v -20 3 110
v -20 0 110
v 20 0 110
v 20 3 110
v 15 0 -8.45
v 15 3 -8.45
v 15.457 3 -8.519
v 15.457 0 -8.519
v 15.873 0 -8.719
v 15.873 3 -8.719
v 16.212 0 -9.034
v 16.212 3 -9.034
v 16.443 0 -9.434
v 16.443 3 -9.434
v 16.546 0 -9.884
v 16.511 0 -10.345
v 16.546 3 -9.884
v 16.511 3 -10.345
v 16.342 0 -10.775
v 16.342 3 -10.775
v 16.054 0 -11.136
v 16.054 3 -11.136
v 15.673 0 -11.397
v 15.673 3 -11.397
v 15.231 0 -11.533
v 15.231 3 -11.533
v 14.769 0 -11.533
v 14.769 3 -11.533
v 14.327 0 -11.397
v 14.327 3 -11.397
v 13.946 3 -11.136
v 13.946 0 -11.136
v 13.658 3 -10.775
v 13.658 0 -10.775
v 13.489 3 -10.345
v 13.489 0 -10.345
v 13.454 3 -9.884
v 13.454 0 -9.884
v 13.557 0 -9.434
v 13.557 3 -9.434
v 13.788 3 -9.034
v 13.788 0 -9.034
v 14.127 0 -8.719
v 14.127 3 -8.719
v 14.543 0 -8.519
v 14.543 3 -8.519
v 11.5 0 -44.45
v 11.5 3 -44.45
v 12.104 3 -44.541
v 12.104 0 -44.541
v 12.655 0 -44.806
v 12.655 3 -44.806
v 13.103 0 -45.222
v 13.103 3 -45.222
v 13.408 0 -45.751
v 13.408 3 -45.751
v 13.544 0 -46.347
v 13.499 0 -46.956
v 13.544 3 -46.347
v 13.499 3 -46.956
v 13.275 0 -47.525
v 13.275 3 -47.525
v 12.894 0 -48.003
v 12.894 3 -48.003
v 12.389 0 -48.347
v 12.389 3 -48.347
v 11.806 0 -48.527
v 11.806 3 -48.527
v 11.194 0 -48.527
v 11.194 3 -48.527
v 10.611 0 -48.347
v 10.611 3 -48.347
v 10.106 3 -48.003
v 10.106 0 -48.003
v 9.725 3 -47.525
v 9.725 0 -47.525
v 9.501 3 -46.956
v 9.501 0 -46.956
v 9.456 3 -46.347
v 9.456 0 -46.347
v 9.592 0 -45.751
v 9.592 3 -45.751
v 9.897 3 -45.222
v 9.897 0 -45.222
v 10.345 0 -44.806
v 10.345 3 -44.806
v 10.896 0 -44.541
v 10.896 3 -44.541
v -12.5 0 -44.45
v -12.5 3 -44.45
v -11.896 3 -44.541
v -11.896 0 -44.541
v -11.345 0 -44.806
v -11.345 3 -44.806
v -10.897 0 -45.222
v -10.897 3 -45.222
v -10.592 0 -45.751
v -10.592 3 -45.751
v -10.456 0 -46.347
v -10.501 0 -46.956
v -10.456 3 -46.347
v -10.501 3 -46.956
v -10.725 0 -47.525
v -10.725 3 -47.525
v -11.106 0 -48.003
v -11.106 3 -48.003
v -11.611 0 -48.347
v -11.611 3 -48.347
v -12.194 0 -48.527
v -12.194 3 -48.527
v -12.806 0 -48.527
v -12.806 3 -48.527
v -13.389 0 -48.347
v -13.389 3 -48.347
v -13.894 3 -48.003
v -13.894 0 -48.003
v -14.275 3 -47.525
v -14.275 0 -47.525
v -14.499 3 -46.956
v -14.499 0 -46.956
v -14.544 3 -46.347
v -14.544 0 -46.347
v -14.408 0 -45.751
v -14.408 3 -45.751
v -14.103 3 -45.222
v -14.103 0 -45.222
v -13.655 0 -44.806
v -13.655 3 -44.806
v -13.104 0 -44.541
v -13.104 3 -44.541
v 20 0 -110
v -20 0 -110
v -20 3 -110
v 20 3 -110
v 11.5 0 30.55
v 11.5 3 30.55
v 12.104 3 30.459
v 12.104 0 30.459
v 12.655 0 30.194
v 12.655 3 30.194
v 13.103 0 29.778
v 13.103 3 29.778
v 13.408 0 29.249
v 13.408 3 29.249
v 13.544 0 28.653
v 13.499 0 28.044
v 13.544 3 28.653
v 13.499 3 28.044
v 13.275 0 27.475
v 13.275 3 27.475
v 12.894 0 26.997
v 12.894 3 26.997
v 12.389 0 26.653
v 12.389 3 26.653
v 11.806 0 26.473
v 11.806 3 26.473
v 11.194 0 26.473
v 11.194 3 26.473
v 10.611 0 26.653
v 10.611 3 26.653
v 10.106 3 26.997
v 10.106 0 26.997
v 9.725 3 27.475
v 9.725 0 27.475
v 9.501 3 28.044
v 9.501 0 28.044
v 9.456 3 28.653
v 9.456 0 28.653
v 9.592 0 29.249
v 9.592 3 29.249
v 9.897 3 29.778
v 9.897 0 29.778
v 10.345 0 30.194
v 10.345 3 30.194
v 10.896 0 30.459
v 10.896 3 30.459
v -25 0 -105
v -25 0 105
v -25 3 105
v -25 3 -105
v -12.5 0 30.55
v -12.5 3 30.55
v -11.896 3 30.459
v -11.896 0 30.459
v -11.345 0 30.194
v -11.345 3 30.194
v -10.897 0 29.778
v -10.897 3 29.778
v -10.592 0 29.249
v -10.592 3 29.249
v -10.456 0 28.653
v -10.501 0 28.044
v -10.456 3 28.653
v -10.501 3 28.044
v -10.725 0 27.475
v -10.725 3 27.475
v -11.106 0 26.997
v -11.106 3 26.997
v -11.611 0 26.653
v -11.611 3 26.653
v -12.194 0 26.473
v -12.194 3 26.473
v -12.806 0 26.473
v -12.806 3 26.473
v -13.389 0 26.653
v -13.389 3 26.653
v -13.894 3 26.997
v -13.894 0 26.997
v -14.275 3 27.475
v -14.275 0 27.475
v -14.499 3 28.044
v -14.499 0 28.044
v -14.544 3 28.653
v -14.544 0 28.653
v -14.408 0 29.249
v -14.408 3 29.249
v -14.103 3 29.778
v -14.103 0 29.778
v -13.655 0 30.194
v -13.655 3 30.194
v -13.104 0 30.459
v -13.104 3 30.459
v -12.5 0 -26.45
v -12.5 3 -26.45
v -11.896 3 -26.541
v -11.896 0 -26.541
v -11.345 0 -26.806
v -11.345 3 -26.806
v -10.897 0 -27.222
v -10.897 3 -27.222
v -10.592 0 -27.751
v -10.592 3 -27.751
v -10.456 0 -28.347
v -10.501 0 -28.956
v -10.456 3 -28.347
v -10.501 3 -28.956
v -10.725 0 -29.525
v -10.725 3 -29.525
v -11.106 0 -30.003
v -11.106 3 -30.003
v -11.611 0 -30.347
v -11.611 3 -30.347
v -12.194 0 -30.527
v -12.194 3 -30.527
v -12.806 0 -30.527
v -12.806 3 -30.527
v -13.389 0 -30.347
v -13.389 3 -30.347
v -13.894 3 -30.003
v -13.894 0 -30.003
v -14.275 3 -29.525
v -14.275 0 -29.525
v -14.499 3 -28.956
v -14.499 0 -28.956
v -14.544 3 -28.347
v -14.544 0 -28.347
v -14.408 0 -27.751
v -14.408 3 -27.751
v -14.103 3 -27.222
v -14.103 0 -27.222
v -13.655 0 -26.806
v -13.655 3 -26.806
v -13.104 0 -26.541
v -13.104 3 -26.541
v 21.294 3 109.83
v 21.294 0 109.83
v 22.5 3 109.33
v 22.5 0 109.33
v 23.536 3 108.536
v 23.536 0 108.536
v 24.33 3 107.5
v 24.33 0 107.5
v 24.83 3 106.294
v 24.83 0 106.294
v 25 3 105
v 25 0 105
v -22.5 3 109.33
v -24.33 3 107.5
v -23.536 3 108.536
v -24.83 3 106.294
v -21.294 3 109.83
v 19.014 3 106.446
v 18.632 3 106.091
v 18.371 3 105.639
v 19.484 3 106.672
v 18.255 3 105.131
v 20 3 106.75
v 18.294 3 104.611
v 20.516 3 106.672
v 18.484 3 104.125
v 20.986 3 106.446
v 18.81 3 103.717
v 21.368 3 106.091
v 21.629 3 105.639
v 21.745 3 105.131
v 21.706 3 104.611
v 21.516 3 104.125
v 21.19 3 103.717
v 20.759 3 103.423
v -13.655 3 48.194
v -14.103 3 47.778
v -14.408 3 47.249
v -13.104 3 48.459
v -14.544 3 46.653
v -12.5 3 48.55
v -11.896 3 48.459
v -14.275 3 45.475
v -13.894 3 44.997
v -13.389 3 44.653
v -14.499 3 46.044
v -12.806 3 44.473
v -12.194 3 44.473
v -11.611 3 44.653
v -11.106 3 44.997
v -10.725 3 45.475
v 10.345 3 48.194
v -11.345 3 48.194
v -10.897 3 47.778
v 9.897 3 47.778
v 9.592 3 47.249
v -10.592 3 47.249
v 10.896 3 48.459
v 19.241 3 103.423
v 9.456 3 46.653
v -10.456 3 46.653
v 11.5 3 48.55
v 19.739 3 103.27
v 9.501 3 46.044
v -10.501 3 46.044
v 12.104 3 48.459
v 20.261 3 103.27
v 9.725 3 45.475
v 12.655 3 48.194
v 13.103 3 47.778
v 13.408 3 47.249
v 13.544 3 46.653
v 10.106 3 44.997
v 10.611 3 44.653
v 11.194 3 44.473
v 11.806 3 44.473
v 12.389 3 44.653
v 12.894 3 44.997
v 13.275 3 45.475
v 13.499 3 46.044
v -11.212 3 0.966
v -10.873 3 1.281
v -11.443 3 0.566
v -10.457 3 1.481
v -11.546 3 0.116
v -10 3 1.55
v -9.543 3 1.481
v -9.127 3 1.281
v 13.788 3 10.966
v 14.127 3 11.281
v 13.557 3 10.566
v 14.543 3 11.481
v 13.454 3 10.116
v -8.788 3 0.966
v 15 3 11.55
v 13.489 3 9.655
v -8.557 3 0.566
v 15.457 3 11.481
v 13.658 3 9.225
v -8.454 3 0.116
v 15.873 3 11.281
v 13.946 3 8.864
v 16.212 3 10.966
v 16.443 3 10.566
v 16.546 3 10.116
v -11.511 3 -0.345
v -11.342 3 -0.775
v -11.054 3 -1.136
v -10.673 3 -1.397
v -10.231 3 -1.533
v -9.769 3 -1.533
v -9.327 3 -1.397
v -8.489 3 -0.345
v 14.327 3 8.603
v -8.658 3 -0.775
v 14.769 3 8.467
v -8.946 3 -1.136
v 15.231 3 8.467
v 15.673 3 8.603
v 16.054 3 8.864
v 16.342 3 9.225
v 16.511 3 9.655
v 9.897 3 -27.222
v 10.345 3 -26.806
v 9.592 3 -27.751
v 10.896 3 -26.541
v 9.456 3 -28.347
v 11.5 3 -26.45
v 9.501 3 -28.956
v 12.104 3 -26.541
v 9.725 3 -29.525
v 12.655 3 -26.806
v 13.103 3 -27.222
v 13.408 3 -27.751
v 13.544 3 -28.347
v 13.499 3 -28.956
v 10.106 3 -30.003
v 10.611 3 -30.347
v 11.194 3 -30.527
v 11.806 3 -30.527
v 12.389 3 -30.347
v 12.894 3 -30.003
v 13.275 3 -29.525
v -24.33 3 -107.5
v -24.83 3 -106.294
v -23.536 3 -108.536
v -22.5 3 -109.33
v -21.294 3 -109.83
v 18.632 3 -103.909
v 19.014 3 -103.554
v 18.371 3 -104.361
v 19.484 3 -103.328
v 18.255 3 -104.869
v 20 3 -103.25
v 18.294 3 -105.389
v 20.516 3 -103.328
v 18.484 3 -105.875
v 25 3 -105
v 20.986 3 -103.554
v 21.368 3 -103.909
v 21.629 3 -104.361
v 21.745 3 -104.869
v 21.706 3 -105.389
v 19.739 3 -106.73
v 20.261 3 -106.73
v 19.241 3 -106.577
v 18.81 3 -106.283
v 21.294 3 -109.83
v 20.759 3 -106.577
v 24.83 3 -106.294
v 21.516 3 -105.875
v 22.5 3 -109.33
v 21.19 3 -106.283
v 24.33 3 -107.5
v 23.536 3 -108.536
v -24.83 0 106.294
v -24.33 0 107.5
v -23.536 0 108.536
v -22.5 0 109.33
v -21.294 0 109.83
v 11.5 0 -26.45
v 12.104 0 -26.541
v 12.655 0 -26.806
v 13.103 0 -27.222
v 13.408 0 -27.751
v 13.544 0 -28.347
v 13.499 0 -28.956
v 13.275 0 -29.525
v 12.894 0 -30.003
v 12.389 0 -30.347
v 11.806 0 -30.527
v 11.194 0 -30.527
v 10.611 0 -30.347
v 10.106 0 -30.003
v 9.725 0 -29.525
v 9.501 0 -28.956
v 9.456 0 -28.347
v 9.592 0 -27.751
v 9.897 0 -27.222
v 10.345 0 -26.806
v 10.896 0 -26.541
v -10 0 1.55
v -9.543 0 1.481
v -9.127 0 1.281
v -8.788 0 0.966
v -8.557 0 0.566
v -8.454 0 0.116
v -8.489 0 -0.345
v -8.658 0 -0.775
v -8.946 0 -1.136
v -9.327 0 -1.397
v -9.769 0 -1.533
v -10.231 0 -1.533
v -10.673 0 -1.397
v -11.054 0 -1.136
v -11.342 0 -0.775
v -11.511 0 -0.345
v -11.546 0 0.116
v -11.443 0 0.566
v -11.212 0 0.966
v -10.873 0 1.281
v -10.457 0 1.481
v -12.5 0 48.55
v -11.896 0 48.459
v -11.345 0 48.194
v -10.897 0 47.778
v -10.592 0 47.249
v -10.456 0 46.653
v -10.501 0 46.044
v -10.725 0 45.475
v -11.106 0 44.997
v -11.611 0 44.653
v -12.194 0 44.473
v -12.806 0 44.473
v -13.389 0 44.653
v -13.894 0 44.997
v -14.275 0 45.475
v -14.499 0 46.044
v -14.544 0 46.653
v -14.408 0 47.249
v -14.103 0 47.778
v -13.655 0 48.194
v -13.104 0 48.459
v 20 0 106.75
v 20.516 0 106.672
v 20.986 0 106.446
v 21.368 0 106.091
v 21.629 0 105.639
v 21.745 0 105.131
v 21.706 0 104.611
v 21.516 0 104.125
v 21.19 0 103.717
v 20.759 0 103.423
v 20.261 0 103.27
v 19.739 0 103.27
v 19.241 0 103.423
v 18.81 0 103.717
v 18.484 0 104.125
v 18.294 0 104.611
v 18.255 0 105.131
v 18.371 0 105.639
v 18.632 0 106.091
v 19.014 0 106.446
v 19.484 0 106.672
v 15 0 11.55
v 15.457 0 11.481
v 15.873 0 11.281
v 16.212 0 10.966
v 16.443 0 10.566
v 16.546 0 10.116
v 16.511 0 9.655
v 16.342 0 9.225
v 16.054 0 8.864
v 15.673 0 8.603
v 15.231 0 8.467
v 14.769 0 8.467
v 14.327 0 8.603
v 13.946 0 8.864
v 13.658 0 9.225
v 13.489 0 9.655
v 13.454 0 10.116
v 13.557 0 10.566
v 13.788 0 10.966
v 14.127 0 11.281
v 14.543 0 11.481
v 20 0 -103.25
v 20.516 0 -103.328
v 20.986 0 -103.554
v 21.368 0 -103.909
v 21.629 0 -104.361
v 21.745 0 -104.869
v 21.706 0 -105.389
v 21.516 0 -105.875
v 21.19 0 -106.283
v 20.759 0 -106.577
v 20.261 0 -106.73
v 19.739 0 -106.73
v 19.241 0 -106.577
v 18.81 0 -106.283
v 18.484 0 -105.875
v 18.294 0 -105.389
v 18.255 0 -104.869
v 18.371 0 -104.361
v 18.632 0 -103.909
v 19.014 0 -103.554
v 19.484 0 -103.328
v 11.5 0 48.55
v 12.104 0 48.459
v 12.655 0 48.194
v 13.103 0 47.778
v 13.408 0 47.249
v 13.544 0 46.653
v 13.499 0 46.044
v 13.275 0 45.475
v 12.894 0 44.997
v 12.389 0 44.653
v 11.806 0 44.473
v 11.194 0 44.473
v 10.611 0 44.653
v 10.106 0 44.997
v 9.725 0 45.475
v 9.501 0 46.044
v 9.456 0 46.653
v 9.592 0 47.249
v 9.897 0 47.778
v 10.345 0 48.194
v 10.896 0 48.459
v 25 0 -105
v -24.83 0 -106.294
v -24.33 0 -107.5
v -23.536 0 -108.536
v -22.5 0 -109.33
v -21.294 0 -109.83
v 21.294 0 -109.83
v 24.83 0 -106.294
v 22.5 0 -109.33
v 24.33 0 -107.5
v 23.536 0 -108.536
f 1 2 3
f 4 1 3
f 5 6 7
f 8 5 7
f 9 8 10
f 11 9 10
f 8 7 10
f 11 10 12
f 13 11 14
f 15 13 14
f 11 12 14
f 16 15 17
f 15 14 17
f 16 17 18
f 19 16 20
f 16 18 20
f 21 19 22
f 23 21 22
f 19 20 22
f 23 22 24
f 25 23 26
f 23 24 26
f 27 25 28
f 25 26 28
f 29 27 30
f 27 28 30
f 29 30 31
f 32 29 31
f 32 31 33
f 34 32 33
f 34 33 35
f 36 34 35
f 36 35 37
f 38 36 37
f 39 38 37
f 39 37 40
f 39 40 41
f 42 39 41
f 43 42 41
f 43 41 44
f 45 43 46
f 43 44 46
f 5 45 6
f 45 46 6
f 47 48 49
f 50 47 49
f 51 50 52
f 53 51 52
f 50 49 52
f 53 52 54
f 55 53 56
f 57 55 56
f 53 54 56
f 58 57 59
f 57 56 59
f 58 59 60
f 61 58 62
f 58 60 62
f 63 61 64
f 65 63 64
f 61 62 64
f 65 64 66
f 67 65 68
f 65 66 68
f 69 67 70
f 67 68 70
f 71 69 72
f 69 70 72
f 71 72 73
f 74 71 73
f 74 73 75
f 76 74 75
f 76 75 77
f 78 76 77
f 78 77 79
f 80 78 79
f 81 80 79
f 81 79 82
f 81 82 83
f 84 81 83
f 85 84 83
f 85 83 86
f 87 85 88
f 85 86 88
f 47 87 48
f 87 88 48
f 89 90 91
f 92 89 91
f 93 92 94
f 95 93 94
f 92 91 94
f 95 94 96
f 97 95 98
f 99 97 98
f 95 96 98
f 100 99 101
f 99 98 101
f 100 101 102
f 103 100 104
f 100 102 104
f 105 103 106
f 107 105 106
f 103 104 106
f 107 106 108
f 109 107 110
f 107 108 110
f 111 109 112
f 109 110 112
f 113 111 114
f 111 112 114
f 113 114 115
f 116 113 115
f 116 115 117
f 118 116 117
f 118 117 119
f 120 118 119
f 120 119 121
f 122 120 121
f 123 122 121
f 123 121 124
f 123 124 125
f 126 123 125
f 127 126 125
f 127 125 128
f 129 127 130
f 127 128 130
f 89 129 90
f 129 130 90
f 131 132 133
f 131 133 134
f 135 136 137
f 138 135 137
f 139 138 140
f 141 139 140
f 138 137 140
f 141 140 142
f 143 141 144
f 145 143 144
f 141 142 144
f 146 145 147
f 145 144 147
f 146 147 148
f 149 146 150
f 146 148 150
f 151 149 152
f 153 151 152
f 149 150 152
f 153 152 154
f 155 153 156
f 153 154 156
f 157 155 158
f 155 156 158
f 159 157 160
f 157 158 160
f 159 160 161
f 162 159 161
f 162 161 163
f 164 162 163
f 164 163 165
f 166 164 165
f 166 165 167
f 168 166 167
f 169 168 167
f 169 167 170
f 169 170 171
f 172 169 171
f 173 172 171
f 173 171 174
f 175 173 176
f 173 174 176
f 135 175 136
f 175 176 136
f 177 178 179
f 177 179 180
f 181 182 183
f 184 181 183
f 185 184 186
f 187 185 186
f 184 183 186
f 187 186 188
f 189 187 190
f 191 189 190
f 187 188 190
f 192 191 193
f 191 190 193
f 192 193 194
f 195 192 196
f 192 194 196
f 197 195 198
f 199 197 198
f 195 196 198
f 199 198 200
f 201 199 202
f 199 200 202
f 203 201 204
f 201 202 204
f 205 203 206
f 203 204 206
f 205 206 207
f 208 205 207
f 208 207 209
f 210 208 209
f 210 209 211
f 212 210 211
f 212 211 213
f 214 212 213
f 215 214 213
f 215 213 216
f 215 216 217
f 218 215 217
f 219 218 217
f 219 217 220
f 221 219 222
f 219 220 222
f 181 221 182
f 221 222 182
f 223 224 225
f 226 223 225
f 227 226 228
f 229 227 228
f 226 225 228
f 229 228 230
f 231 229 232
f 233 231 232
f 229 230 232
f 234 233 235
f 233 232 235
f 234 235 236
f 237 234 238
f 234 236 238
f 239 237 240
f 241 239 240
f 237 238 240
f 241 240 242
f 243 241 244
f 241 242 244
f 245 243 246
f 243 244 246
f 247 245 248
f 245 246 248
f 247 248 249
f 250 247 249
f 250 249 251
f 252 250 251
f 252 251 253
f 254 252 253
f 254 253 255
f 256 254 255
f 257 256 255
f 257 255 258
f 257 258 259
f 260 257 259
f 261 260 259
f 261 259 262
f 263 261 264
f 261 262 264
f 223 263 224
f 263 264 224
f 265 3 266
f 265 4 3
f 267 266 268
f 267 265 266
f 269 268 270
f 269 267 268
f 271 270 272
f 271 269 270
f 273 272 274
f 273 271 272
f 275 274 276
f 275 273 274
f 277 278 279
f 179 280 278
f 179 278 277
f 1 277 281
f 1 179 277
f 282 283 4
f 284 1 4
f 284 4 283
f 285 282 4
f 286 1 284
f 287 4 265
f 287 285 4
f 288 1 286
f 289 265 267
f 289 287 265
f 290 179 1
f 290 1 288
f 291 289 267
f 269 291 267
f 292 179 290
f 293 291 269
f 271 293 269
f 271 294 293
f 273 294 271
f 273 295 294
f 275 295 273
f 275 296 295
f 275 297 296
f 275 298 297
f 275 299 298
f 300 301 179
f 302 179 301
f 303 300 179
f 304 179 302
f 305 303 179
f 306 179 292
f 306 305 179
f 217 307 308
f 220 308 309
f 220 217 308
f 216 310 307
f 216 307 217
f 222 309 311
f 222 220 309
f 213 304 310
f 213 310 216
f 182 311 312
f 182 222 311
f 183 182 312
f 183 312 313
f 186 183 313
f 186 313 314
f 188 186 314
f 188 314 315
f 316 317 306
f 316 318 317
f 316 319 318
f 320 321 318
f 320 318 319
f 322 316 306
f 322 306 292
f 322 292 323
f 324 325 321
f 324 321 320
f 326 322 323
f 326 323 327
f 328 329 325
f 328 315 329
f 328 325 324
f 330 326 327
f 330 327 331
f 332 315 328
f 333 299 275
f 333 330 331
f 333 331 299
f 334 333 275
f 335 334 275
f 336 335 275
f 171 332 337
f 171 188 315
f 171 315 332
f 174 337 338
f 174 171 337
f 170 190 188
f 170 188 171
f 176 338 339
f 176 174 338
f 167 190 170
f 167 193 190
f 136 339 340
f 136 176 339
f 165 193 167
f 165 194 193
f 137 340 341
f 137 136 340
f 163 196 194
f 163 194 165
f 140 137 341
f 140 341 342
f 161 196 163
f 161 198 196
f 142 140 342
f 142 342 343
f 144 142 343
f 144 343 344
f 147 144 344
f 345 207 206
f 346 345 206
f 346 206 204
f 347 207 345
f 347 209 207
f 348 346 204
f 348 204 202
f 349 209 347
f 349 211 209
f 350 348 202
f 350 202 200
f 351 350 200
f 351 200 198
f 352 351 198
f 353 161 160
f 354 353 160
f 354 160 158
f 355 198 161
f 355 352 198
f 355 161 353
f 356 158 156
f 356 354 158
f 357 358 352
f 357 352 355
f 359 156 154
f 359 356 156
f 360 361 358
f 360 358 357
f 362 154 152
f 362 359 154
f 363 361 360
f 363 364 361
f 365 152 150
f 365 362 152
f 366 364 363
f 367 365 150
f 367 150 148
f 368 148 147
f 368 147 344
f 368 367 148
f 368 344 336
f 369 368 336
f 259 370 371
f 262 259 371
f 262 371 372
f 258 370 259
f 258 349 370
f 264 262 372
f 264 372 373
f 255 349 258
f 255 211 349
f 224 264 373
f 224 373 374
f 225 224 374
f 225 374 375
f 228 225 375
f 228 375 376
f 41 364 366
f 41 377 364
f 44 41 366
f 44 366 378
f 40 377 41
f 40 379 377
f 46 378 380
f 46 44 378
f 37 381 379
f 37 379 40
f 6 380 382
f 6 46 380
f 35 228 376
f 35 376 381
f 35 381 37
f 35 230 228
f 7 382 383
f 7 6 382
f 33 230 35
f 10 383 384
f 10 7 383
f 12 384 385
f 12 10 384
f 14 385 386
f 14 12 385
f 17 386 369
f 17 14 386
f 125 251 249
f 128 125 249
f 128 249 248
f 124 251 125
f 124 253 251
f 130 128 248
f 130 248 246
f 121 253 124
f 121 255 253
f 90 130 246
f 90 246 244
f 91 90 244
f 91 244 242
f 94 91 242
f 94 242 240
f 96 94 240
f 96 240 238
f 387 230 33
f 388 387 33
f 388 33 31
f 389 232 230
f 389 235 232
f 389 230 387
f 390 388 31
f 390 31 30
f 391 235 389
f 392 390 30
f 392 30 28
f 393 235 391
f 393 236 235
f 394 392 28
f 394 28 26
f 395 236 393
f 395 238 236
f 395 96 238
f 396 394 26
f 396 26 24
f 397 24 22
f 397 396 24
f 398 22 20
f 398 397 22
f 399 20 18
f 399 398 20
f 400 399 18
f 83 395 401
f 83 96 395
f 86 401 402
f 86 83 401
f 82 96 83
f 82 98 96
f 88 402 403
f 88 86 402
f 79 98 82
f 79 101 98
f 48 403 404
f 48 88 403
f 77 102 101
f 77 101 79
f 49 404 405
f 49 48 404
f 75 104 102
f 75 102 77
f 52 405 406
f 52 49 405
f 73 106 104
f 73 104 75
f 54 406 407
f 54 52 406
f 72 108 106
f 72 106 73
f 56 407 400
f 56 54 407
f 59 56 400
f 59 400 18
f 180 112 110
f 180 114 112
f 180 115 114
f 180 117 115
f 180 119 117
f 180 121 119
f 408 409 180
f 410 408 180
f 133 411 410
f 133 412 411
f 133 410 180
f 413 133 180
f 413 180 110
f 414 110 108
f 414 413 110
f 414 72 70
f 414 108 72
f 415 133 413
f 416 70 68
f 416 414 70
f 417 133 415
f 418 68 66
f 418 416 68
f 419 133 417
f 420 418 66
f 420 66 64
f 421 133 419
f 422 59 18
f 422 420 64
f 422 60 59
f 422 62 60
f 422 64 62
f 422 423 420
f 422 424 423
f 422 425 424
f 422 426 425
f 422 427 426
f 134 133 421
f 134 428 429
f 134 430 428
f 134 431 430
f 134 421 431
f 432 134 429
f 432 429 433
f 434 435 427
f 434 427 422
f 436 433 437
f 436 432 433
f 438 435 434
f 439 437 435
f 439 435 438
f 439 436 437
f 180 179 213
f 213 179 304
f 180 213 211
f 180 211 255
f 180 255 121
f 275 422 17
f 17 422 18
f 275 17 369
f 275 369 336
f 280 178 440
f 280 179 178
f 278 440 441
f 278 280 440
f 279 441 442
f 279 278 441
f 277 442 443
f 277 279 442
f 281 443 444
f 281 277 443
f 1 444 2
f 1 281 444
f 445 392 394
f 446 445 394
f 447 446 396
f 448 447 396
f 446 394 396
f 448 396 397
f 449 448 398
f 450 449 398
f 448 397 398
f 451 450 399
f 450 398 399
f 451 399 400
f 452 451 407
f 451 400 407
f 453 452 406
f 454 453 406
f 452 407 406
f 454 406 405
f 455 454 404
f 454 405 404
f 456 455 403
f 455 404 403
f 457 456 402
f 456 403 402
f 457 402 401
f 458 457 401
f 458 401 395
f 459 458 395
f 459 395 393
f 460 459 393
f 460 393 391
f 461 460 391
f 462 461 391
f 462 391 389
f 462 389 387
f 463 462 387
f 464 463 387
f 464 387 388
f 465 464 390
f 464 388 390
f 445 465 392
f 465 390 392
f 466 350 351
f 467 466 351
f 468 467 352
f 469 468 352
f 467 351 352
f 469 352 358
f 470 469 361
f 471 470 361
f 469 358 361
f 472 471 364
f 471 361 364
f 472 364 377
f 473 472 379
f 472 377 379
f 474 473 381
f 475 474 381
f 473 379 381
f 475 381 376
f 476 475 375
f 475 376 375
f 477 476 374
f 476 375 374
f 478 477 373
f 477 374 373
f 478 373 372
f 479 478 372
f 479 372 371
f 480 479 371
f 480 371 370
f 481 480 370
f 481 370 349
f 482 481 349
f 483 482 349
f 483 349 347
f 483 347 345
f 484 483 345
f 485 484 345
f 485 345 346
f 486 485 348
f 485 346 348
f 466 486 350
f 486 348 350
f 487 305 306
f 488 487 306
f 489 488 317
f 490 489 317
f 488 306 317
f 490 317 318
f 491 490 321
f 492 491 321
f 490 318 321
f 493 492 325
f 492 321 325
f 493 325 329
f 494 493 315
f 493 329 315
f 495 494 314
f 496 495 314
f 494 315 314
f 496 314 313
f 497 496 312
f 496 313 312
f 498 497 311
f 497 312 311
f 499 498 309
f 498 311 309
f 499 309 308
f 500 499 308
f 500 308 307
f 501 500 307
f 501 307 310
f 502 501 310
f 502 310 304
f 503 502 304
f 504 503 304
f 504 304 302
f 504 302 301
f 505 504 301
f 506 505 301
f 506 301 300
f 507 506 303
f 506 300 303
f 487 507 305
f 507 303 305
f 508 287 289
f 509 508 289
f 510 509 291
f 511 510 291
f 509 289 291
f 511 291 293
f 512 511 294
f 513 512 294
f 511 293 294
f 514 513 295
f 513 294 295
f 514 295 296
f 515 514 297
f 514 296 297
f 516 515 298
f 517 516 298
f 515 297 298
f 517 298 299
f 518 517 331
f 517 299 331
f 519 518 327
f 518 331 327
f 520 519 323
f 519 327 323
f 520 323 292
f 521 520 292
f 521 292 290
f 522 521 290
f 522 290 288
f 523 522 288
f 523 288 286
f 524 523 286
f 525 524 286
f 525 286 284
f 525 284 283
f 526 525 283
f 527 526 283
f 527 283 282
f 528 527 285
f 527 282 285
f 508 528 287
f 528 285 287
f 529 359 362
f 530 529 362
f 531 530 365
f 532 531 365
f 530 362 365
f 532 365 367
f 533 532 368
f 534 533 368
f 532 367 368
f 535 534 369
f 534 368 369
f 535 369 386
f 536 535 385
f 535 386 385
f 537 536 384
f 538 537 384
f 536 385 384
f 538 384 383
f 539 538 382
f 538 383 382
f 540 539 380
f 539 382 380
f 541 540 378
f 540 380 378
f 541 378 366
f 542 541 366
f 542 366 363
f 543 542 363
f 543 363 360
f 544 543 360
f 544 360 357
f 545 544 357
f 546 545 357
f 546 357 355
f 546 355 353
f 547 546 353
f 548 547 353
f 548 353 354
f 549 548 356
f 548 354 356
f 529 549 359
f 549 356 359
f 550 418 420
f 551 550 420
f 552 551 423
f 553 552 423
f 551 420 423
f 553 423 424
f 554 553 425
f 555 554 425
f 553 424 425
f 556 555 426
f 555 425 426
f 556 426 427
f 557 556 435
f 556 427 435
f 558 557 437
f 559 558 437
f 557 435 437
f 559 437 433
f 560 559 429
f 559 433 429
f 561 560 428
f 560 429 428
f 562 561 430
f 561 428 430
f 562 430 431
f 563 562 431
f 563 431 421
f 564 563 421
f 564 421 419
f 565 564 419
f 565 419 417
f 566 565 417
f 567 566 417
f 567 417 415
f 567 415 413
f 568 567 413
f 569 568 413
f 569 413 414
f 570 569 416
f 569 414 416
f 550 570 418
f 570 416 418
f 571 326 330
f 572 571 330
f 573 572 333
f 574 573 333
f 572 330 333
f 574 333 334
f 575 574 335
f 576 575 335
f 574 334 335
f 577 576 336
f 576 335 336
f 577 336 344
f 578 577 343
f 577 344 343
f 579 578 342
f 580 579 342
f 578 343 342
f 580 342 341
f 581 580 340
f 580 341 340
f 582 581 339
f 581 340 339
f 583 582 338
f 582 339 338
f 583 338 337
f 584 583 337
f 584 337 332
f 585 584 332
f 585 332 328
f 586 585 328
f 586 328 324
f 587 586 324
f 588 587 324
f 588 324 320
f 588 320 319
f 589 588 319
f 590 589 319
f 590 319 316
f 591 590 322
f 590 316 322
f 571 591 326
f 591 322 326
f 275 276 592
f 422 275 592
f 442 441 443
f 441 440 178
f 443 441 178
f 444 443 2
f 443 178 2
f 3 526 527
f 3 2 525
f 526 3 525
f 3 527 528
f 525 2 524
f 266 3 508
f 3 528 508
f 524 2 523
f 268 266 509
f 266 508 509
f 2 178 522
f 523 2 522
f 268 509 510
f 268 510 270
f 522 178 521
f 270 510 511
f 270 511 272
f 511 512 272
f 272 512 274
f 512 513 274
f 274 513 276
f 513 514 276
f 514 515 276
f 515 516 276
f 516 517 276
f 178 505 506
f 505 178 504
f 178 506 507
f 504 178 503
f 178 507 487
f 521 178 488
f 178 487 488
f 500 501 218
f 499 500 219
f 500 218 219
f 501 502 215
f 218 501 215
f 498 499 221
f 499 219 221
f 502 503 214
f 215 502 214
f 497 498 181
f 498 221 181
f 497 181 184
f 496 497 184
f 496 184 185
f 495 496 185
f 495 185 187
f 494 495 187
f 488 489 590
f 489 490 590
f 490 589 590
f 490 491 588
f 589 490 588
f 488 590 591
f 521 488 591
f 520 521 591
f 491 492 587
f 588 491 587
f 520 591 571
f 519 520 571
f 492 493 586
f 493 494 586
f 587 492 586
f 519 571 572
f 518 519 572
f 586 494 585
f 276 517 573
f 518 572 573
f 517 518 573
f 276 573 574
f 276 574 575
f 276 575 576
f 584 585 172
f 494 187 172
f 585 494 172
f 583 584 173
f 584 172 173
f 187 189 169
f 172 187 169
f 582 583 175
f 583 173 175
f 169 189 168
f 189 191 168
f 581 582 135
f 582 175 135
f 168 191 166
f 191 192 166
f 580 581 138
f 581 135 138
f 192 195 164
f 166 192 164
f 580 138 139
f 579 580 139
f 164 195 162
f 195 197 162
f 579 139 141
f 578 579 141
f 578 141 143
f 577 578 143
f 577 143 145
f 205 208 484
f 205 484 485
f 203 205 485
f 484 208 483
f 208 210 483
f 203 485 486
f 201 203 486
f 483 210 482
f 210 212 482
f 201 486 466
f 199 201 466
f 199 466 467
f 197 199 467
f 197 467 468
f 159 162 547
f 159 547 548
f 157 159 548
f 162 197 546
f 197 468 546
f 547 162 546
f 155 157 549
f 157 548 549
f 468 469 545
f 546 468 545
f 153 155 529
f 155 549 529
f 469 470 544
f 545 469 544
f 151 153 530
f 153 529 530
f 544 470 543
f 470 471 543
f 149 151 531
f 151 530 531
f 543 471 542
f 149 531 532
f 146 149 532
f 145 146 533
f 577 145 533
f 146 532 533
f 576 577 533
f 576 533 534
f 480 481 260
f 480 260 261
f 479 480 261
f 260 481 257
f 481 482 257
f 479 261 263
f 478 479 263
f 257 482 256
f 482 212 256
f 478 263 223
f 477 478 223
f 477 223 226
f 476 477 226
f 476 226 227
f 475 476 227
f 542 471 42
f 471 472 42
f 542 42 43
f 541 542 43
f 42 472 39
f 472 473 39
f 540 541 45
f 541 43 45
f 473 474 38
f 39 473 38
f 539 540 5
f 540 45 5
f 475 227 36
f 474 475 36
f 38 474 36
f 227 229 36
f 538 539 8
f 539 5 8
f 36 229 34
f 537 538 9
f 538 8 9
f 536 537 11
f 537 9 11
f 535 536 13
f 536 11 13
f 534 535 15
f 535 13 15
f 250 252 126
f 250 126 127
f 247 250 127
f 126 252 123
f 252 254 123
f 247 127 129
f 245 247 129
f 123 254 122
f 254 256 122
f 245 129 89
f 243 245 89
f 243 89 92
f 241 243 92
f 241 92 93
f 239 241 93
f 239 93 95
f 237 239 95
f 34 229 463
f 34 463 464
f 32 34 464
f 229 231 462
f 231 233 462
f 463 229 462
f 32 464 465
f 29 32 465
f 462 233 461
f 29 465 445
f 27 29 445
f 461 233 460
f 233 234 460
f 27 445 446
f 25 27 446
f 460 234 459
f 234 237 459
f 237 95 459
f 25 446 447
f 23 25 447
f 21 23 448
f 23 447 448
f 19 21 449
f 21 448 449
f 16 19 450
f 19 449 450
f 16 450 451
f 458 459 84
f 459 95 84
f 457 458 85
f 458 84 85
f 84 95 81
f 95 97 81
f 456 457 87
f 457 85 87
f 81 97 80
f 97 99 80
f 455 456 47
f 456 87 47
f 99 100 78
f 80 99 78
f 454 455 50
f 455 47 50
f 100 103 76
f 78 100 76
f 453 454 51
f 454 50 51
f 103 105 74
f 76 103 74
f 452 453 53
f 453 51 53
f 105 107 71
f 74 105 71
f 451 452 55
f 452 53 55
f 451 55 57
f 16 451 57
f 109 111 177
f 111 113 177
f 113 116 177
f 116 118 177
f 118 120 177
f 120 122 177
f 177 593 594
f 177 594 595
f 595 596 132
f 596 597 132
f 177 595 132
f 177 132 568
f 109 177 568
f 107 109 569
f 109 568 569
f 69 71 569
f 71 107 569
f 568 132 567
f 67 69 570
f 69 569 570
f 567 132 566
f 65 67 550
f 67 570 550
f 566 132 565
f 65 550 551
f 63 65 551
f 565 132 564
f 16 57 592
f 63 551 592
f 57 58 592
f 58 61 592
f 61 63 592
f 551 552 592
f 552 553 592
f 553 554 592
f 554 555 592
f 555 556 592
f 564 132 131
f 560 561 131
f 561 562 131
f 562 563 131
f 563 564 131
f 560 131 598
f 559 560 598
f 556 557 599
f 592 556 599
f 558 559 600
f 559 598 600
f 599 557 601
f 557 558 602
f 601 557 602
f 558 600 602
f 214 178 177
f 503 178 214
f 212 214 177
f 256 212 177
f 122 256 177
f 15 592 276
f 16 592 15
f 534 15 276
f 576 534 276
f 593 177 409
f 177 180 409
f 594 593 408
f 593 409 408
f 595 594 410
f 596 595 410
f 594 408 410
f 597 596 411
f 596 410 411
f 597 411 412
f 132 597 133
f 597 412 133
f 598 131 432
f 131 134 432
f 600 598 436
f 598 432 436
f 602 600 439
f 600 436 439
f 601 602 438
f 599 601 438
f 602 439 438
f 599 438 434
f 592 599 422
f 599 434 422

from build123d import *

# Parameters (mm, degrees)
SKETCH1_W       = 50
SKETCH1_H       = 220
EXTRUDE1_DEPTH  = 3
SKETCH2_R       = 1.75
EXTRUDE2_DEPTH  = 3
SKETCH3_R       = 2.05
EXTRUDE3_DEPTH  = 3
SKETCH4_R       = 1.55
EXTRUDE4_DEPTH  = 3
LPATTERN1_COUNT = 2
LPATTERN1_PITCH = 210
LPATTERN2_COUNT = 2
LPATTERN2_PITCH = 75
FILLET1_R       = 5


with BuildPart() as part:
    # Sketch1 → Extrude1 (new body)
    with BuildSketch(Plane(origin=(0, 0, 0), x_dir=(1, 0, 0), z_dir=(0, 1, 0))):
        Rectangle(SKETCH1_W, SKETCH1_H)
    extrude(amount=EXTRUDE1_DEPTH)

    # Sketch2 → Extrude2 (cut)
    with BuildSketch(Plane(origin=(0, 3, 0), x_dir=(1, 0, 0), z_dir=(0, 1, 0))):
        with Locations(Location((20, 105, 0), (0, 0, 270))):
            Circle(SKETCH2_R)
    extrude2 = extrude(amount=-EXTRUDE2_DEPTH, mode=Mode.SUBTRACT)

    # Sketch3 → Extrude3 (cut)
    with BuildSketch(Plane(origin=(0, 3, 0), x_dir=(1, 0, 0), z_dir=(0, 1, 0))):
        with Locations(Location((-12.5, 46.5, 0), (0, 0, 270))):
            Circle(SKETCH3_R)
        with Locations(Location((11.5, 46.5, 0), (0, 0, 270))):
            Circle(SKETCH3_R)
        with Locations(Location((-12.5, 28.5, 0), (0, 0, 270))):
            Circle(SKETCH3_R)
        with Locations(Location((11.5, 28.5, 0), (0, 0, 270))):
            Circle(SKETCH3_R)
    extrude3 = extrude(amount=-EXTRUDE3_DEPTH, mode=Mode.SUBTRACT)

    # Sketch4 → Extrude4 (cut)
    with BuildSketch(Plane(origin=(0, 3, 0), x_dir=(1, 0, 0), z_dir=(0, 1, 0))):
        with Locations(Location((15, 10, 0), (0, 0, 270))):
            Circle(SKETCH4_R)
        with Locations(Location((15, -10, 0), (0, 0, 270))):
            Circle(SKETCH4_R)
        with Locations(Location((-10, 0, 0), (0, 0, 270))):
            Circle(SKETCH4_R)
    extrude(amount=-EXTRUDE4_DEPTH, mode=Mode.SUBTRACT)

    # LPattern1: Extrude2 ×2
    with Locations(*[(0, 0, i * LPATTERN1_PITCH) for i in range(1, LPATTERN1_COUNT)]):
        add(extrude2, mode=Mode.SUBTRACT)

    # LPattern2: Extrude3 ×2
    with Locations(*[(0, 0, i * LPATTERN2_PITCH) for i in range(1, LPATTERN2_COUNT)]):
        add(extrude3, mode=Mode.SUBTRACT)

    # Fillet1
    fillet1_edges = [part.edges().sort_by_distance(p)[0] for p in [
        (-25, 1.5, -110),
        (25, 1.5, -110),
        (25, 1.5, 110),
        (-25, 1.5, 110),
    ]]
    fillet(fillet1_edges, radius=FILLET1_R)


solid = part.part
